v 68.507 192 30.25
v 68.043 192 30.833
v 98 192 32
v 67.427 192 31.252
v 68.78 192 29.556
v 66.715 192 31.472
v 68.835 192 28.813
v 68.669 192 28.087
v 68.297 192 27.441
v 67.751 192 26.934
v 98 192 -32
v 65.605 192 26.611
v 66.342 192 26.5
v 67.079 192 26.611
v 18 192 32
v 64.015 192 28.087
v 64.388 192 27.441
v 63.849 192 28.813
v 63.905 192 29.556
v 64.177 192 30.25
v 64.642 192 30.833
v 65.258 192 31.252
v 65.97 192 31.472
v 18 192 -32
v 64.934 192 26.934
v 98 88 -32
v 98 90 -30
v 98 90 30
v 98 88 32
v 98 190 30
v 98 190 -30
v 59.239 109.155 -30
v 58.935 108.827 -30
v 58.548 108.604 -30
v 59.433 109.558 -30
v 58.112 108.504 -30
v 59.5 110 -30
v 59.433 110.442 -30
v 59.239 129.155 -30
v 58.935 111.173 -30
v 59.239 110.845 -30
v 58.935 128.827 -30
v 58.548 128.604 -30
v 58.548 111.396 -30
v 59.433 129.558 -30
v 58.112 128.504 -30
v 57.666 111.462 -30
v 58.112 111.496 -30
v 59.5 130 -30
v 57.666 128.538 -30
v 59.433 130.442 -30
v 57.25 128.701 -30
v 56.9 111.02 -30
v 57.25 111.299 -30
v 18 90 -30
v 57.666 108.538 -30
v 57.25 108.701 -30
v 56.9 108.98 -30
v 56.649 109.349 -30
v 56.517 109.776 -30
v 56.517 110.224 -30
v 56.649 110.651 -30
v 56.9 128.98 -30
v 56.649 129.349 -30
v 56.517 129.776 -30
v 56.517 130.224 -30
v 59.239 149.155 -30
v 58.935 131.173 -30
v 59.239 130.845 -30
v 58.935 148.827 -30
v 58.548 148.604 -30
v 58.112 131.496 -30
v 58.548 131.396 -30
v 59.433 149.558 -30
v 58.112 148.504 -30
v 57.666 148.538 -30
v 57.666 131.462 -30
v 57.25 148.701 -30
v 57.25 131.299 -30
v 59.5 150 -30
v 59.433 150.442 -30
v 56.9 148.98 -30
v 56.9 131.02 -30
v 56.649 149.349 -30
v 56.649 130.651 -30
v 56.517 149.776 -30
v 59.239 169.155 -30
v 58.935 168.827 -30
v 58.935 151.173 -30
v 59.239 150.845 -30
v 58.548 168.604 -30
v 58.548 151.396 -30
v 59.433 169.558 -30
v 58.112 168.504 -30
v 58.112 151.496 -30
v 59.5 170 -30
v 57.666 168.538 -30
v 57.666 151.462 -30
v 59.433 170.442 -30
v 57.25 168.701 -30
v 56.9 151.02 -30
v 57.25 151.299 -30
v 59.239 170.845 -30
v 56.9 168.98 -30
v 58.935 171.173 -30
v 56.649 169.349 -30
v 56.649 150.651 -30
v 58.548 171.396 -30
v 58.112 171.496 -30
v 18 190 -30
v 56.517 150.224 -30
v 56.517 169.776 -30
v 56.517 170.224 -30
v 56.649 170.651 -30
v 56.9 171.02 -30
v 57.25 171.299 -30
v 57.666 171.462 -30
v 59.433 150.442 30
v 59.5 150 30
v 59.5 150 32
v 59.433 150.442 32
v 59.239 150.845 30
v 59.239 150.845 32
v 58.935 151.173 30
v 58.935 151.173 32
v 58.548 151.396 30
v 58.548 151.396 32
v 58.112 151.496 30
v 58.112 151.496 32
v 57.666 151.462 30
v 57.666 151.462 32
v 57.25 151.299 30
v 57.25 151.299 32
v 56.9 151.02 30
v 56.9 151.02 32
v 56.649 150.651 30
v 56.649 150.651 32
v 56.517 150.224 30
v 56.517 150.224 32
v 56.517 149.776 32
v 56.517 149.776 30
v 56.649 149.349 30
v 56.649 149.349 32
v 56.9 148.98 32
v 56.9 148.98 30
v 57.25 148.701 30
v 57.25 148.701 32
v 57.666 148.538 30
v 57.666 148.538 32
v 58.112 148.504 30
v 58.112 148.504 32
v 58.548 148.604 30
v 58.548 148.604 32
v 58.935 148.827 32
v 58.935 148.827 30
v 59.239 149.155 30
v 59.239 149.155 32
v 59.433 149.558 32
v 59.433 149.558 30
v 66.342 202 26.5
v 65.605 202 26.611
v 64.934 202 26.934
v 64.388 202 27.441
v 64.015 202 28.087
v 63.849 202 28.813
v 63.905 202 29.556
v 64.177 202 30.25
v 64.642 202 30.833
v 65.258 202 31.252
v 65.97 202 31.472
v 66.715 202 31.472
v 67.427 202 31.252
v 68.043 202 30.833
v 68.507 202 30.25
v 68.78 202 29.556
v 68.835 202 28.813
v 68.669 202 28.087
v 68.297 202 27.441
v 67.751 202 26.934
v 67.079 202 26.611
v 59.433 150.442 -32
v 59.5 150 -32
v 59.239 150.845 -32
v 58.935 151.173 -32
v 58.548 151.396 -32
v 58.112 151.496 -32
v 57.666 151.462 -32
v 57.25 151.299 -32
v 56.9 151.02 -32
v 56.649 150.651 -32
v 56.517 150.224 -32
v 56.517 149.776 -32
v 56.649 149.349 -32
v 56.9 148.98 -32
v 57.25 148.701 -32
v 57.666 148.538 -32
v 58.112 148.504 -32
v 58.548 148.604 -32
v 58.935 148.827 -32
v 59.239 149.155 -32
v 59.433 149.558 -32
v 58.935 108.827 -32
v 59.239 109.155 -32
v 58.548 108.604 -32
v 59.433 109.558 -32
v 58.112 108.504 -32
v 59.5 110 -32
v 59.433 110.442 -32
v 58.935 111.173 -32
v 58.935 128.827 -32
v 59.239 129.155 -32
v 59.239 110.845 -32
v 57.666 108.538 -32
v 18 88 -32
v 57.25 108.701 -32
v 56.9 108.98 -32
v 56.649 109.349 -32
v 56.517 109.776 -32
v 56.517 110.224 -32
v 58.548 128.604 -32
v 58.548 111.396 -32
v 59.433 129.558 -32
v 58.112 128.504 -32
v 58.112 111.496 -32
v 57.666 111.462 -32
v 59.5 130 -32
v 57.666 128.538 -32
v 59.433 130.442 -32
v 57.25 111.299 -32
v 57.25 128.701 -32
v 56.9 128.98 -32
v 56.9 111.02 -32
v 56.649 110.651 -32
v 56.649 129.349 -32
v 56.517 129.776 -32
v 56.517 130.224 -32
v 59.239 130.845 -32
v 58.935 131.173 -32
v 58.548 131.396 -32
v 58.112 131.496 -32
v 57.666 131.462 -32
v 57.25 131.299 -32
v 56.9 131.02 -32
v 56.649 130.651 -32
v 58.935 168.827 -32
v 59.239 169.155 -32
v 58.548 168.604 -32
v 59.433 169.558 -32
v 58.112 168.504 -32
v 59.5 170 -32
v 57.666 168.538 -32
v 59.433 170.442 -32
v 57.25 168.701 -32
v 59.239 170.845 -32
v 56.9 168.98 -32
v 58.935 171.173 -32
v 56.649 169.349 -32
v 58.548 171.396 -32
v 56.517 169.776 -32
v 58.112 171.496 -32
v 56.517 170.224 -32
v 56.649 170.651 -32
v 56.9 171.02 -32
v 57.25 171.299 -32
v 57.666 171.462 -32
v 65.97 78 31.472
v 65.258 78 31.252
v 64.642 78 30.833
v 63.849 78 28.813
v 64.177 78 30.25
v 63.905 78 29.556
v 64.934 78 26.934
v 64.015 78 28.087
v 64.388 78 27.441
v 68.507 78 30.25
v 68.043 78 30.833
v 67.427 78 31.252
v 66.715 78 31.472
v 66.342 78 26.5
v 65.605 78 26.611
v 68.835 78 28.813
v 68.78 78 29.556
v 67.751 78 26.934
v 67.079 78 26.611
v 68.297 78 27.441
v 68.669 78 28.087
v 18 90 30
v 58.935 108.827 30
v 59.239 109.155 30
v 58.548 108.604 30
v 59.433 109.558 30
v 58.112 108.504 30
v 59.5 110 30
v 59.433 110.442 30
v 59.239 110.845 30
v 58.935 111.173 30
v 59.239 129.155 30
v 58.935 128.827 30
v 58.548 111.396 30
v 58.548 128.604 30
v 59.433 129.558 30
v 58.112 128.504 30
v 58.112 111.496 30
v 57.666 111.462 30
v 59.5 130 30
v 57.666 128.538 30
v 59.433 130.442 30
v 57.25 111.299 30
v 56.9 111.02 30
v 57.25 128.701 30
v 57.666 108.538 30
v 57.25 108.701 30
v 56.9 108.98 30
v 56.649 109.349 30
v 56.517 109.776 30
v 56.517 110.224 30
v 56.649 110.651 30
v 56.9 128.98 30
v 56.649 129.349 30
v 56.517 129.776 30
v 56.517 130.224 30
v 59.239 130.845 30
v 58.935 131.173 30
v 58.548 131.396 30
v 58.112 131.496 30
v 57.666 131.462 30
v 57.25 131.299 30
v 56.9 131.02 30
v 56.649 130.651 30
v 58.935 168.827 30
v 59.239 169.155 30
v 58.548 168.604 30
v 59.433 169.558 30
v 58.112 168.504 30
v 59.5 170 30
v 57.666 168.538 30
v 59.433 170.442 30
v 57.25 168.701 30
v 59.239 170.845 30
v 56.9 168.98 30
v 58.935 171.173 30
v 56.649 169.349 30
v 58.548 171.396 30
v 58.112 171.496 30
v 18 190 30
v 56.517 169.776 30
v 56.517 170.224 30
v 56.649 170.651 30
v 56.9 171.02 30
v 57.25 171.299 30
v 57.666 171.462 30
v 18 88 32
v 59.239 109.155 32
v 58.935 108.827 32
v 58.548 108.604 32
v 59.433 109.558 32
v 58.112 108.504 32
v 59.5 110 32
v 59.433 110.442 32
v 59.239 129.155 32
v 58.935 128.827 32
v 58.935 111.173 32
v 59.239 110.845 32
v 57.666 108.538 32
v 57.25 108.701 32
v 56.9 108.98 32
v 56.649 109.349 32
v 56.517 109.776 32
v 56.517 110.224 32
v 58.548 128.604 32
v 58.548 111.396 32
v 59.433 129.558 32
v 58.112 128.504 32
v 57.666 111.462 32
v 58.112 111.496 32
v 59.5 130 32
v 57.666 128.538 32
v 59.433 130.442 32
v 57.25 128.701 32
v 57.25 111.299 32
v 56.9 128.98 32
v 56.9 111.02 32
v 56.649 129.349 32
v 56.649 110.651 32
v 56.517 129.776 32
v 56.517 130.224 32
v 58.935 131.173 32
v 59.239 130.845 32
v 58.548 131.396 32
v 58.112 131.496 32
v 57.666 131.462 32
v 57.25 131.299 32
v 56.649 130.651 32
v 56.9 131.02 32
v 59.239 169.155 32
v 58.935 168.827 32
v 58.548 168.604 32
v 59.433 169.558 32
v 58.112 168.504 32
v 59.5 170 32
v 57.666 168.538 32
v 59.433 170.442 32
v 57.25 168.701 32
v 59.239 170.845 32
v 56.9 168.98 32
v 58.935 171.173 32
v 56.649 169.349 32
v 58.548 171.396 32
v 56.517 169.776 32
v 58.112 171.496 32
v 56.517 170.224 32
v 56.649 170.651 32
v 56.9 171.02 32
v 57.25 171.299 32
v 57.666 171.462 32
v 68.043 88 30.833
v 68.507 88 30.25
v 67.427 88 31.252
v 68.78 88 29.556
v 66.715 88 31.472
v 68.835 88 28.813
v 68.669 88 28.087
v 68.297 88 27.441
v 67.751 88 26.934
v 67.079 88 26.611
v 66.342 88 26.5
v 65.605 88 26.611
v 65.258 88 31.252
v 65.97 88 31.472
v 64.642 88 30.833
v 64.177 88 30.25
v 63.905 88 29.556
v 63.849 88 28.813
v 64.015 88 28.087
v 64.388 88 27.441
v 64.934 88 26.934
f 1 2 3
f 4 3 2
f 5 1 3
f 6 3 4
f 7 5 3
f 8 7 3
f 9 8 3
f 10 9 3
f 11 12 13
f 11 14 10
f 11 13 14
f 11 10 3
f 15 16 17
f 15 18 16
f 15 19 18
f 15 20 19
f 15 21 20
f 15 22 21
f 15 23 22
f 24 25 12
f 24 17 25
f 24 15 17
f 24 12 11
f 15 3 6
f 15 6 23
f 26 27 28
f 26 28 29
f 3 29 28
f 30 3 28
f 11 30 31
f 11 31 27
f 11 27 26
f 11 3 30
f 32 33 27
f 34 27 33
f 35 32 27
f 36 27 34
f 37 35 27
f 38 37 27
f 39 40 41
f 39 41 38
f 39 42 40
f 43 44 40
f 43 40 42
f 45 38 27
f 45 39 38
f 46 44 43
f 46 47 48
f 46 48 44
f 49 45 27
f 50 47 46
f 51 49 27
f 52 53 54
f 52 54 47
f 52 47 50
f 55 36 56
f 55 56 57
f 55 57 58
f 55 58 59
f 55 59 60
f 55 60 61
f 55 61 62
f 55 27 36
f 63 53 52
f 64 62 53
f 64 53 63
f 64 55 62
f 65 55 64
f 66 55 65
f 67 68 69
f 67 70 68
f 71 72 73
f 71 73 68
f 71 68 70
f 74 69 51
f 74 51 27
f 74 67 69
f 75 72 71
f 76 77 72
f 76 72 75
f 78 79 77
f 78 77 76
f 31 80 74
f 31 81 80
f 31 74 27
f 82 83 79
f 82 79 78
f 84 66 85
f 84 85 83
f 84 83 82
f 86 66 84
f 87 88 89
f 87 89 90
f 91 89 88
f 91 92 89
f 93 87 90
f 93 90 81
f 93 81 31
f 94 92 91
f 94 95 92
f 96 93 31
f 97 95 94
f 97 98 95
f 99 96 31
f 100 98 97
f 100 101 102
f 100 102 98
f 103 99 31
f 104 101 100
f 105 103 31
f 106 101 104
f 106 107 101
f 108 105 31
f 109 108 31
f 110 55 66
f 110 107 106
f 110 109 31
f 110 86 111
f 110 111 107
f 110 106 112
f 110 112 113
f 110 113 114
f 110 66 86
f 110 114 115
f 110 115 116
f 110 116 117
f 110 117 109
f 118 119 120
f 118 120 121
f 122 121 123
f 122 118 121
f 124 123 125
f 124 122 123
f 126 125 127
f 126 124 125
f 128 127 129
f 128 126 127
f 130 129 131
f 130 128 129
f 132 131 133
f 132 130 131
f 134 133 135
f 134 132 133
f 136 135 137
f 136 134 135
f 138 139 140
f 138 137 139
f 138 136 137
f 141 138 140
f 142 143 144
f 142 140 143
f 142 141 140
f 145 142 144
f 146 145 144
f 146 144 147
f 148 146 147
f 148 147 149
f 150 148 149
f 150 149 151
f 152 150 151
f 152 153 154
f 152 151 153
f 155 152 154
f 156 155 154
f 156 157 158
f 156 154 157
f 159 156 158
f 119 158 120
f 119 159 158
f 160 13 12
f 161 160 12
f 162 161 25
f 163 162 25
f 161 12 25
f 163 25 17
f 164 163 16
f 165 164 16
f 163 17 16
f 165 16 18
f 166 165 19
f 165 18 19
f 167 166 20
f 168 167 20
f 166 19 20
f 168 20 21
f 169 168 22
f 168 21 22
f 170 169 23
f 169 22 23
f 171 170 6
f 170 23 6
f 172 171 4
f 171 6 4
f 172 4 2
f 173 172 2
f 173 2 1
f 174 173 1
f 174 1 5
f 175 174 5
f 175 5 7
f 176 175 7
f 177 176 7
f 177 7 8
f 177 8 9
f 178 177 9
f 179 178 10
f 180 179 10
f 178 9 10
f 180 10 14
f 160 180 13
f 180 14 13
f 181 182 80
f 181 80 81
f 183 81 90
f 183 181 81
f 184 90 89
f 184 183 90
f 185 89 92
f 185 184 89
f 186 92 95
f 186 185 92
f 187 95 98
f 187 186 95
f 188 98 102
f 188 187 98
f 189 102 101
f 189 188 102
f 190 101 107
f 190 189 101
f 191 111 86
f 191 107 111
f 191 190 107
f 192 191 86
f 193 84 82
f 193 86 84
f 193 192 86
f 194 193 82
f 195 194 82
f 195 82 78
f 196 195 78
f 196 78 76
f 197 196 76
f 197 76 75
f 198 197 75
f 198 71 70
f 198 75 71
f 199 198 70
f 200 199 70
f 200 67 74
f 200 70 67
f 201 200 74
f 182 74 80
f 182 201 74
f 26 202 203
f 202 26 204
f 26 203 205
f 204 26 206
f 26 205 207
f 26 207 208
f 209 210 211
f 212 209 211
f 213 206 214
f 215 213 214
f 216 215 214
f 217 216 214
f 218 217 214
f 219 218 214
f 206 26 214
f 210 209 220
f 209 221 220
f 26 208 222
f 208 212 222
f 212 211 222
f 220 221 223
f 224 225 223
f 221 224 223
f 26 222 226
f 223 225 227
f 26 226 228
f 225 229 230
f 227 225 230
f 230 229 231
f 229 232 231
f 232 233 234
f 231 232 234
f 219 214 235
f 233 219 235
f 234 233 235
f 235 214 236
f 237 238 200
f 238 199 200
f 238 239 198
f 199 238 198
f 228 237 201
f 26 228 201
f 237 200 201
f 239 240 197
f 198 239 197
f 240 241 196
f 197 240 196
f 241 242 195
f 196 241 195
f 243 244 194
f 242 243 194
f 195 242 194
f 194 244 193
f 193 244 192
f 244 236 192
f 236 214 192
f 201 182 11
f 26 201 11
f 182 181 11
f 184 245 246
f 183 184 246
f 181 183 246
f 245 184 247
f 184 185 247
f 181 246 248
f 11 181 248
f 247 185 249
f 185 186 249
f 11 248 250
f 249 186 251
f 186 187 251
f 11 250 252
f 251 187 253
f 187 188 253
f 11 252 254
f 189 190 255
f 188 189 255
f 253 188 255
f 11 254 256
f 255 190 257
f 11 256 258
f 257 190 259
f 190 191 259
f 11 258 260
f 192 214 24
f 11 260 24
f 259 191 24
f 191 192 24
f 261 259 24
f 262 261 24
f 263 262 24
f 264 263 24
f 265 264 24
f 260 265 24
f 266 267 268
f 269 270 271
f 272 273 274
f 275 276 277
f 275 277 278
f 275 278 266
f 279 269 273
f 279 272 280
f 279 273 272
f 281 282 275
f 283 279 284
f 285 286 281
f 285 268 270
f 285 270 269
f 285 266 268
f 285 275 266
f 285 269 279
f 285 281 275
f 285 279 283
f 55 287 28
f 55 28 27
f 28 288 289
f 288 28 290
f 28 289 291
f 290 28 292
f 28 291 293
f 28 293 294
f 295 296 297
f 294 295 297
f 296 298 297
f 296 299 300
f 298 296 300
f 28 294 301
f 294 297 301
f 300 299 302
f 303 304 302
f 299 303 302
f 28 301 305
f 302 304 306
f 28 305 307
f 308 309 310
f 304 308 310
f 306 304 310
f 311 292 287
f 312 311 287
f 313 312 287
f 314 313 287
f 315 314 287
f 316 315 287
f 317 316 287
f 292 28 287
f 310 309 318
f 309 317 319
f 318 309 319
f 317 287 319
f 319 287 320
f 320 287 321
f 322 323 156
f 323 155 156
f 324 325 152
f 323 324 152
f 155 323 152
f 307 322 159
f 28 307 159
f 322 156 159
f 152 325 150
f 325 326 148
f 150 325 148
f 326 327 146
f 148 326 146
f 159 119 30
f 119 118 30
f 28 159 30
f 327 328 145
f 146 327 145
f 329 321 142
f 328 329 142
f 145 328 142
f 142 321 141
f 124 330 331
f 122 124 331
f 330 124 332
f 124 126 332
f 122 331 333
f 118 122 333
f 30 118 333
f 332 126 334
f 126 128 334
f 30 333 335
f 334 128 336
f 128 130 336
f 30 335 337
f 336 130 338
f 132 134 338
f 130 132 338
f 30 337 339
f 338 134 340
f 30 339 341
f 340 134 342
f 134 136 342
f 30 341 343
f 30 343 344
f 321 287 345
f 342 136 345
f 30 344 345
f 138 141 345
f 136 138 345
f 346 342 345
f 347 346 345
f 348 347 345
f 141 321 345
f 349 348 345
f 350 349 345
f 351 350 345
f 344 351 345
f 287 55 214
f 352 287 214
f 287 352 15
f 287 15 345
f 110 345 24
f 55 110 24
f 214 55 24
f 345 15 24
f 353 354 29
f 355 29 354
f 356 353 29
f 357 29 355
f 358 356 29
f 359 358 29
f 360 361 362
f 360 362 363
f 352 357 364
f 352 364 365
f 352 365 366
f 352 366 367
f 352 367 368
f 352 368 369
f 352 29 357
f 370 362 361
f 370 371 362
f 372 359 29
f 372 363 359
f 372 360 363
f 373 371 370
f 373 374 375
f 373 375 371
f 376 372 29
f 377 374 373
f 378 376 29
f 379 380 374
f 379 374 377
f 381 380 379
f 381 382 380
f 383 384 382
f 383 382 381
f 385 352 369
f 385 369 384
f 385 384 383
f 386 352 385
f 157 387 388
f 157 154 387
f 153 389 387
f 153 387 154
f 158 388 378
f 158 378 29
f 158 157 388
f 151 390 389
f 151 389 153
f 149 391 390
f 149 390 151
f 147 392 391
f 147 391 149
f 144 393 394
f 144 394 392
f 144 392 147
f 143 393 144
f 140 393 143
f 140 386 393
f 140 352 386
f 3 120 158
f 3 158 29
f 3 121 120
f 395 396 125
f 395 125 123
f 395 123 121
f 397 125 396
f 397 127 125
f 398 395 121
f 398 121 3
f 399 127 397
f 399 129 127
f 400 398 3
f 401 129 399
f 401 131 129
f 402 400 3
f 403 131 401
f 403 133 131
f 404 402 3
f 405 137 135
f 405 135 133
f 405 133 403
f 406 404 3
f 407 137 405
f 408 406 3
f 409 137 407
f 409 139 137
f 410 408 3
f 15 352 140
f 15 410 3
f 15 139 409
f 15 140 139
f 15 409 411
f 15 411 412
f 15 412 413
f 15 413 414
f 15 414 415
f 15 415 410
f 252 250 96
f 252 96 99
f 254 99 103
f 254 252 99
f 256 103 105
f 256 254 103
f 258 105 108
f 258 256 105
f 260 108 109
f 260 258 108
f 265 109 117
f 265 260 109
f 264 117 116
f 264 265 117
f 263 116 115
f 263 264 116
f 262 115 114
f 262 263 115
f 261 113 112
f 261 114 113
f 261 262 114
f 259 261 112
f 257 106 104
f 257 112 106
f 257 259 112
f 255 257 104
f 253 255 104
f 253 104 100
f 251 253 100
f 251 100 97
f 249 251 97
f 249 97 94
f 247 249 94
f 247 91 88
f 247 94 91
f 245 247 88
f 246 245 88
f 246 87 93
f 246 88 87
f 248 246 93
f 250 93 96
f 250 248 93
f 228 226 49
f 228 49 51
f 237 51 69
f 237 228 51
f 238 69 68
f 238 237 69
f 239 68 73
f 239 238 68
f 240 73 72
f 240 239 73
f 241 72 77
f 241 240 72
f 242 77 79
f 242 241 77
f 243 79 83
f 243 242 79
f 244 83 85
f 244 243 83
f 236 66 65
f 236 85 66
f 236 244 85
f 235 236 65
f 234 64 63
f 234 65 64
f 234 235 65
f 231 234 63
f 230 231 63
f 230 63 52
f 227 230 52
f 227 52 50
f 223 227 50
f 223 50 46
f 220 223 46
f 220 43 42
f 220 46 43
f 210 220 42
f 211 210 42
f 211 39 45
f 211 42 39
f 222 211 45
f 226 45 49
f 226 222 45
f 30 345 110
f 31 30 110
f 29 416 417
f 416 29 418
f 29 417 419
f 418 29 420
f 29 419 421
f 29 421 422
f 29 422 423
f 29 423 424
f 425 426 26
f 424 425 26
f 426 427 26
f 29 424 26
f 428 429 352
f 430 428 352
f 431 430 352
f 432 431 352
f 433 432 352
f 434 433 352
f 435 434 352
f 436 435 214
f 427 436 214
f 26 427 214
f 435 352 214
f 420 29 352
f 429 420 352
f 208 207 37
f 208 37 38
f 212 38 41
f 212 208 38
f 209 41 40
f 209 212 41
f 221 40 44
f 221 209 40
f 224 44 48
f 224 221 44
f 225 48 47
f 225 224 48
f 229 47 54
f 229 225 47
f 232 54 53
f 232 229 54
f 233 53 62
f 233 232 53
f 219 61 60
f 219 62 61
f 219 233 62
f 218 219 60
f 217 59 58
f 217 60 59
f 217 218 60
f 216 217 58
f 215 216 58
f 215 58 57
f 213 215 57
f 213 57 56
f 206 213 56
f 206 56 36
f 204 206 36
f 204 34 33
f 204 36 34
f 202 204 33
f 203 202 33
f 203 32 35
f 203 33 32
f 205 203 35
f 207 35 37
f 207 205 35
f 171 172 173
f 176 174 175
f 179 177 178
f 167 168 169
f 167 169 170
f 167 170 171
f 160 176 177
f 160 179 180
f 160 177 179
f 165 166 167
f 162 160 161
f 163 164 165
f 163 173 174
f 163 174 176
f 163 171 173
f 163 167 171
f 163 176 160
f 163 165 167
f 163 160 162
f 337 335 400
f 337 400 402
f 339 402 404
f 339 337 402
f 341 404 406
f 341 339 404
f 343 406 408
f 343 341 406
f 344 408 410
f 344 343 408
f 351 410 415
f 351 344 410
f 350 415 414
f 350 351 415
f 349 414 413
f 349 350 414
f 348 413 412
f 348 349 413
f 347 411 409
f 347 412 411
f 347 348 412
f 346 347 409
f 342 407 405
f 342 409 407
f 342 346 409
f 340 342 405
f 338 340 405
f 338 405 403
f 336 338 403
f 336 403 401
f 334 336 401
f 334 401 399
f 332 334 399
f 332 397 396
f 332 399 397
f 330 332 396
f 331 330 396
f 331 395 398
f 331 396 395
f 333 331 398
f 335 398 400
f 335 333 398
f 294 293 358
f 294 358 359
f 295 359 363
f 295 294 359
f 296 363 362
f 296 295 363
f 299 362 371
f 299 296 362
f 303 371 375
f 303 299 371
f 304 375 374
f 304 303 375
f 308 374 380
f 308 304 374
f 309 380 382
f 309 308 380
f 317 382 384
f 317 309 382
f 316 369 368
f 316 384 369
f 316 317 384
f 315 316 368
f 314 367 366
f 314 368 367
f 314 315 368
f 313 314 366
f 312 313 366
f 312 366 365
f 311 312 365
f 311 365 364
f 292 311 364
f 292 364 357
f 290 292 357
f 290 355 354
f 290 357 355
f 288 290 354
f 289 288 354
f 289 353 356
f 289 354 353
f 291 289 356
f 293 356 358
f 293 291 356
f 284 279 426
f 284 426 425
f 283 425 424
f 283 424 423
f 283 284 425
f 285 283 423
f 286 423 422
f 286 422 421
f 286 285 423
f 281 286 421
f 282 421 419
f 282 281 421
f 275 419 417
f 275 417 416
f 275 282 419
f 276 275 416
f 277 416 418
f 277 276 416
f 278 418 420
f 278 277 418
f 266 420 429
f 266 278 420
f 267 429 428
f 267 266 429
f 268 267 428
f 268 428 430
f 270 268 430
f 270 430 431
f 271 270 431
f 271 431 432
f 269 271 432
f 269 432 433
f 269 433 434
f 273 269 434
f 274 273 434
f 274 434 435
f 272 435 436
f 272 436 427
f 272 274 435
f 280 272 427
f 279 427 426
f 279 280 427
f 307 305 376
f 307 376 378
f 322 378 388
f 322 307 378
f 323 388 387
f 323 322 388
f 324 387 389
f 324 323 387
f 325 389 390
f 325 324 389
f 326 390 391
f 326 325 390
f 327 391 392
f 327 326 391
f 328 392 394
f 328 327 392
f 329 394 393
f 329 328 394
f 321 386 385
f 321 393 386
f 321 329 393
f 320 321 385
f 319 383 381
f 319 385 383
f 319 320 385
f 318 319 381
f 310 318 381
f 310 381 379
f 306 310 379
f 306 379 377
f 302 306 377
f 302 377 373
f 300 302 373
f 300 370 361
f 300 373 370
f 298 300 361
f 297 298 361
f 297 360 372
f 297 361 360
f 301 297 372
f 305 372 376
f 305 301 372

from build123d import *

# Parameters (mm, degrees)
DUCT_THROAT_START           = 18
SKETCH1_W                   = 60
SKETCH1_H                   = 100
DUCT_THROAT_DEPTH           = 80
CARBON_WALL_SHELL_T         = 2
PIVOT_HOLE_PAIRS_DEPTH      = 218.926593145
PIVOT_HOLE_PAIRS_DEPTH_BACK = 218.926593145
SKETCH2_R                   = 1.5
SKETCH3_R                   = 2.5
SMA_ANCHOR_PEG_DEPTH        = 10
BIAS_ANCHOR_PEG_START       = 10
SKETCH4_R                   = 2.5
BIAS_ANCHOR_PEG_DEPTH       = 10


with BuildPart() as part:
    # Sketch1 → Duct_Throat (new body)
    with BuildSketch(Plane(origin=(0, 0, 0), x_dir=(0, 0, -1), z_dir=(1, 0, 0)).offset(DUCT_THROAT_START)):
        with Locations((0, 140)):
            Rectangle(SKETCH1_W, SKETCH1_H)
    extrude(amount=DUCT_THROAT_DEPTH)

    # Carbon_Wall_Shell
    carbon_wall_shell_openings = [part.faces().sort_by_distance(p)[0] for p in [
        (18, 140, 0),
        (98, 140, 0),
    ]]
    offset(amount=CARBON_WALL_SHELL_T, openings=carbon_wall_shell_openings, kind=Kind.INTERSECTION)

    # Sketch2 → Pivot_Hole_Pairs (cut, two sides: drawn at the far end of the back side and taken through both)
    with BuildSketch(Plane.XY.offset(-PIVOT_HOLE_PAIRS_DEPTH_BACK)):
        with Locations((58, 110)):
            Circle(SKETCH2_R)
        with Locations((58, 130)):
            Circle(SKETCH2_R)
        with Locations((58, 150)):
            Circle(SKETCH2_R)
        with Locations((58, 170)):
            Circle(SKETCH2_R)
    extrude(amount=PIVOT_HOLE_PAIRS_DEPTH + PIVOT_HOLE_PAIRS_DEPTH_BACK, mode=Mode.SUBTRACT)

    # Sketch3 → SMA_Anchor_Peg (add)
    with BuildSketch(Plane(origin=(0, 192, 0), x_dir=(1, 0, 0), z_dir=(0, 1, 0))):
        with Locations(Location((66.342275148, -29, 0), (0, 0, 90))):
            Circle(SKETCH3_R)
    extrude(amount=SMA_ANCHOR_PEG_DEPTH)

    # Sketch4 → Bias_Anchor_Peg (add)
    with BuildSketch(Plane.XZ.offset(-88).offset(BIAS_ANCHOR_PEG_START)):
        with Locations(Location((66.342275148, 29, 0), (0, 0, 270))):
            Circle(SKETCH4_R)
    extrude(amount=-BIAS_ANCHOR_PEG_DEPTH)


solid = part.part
